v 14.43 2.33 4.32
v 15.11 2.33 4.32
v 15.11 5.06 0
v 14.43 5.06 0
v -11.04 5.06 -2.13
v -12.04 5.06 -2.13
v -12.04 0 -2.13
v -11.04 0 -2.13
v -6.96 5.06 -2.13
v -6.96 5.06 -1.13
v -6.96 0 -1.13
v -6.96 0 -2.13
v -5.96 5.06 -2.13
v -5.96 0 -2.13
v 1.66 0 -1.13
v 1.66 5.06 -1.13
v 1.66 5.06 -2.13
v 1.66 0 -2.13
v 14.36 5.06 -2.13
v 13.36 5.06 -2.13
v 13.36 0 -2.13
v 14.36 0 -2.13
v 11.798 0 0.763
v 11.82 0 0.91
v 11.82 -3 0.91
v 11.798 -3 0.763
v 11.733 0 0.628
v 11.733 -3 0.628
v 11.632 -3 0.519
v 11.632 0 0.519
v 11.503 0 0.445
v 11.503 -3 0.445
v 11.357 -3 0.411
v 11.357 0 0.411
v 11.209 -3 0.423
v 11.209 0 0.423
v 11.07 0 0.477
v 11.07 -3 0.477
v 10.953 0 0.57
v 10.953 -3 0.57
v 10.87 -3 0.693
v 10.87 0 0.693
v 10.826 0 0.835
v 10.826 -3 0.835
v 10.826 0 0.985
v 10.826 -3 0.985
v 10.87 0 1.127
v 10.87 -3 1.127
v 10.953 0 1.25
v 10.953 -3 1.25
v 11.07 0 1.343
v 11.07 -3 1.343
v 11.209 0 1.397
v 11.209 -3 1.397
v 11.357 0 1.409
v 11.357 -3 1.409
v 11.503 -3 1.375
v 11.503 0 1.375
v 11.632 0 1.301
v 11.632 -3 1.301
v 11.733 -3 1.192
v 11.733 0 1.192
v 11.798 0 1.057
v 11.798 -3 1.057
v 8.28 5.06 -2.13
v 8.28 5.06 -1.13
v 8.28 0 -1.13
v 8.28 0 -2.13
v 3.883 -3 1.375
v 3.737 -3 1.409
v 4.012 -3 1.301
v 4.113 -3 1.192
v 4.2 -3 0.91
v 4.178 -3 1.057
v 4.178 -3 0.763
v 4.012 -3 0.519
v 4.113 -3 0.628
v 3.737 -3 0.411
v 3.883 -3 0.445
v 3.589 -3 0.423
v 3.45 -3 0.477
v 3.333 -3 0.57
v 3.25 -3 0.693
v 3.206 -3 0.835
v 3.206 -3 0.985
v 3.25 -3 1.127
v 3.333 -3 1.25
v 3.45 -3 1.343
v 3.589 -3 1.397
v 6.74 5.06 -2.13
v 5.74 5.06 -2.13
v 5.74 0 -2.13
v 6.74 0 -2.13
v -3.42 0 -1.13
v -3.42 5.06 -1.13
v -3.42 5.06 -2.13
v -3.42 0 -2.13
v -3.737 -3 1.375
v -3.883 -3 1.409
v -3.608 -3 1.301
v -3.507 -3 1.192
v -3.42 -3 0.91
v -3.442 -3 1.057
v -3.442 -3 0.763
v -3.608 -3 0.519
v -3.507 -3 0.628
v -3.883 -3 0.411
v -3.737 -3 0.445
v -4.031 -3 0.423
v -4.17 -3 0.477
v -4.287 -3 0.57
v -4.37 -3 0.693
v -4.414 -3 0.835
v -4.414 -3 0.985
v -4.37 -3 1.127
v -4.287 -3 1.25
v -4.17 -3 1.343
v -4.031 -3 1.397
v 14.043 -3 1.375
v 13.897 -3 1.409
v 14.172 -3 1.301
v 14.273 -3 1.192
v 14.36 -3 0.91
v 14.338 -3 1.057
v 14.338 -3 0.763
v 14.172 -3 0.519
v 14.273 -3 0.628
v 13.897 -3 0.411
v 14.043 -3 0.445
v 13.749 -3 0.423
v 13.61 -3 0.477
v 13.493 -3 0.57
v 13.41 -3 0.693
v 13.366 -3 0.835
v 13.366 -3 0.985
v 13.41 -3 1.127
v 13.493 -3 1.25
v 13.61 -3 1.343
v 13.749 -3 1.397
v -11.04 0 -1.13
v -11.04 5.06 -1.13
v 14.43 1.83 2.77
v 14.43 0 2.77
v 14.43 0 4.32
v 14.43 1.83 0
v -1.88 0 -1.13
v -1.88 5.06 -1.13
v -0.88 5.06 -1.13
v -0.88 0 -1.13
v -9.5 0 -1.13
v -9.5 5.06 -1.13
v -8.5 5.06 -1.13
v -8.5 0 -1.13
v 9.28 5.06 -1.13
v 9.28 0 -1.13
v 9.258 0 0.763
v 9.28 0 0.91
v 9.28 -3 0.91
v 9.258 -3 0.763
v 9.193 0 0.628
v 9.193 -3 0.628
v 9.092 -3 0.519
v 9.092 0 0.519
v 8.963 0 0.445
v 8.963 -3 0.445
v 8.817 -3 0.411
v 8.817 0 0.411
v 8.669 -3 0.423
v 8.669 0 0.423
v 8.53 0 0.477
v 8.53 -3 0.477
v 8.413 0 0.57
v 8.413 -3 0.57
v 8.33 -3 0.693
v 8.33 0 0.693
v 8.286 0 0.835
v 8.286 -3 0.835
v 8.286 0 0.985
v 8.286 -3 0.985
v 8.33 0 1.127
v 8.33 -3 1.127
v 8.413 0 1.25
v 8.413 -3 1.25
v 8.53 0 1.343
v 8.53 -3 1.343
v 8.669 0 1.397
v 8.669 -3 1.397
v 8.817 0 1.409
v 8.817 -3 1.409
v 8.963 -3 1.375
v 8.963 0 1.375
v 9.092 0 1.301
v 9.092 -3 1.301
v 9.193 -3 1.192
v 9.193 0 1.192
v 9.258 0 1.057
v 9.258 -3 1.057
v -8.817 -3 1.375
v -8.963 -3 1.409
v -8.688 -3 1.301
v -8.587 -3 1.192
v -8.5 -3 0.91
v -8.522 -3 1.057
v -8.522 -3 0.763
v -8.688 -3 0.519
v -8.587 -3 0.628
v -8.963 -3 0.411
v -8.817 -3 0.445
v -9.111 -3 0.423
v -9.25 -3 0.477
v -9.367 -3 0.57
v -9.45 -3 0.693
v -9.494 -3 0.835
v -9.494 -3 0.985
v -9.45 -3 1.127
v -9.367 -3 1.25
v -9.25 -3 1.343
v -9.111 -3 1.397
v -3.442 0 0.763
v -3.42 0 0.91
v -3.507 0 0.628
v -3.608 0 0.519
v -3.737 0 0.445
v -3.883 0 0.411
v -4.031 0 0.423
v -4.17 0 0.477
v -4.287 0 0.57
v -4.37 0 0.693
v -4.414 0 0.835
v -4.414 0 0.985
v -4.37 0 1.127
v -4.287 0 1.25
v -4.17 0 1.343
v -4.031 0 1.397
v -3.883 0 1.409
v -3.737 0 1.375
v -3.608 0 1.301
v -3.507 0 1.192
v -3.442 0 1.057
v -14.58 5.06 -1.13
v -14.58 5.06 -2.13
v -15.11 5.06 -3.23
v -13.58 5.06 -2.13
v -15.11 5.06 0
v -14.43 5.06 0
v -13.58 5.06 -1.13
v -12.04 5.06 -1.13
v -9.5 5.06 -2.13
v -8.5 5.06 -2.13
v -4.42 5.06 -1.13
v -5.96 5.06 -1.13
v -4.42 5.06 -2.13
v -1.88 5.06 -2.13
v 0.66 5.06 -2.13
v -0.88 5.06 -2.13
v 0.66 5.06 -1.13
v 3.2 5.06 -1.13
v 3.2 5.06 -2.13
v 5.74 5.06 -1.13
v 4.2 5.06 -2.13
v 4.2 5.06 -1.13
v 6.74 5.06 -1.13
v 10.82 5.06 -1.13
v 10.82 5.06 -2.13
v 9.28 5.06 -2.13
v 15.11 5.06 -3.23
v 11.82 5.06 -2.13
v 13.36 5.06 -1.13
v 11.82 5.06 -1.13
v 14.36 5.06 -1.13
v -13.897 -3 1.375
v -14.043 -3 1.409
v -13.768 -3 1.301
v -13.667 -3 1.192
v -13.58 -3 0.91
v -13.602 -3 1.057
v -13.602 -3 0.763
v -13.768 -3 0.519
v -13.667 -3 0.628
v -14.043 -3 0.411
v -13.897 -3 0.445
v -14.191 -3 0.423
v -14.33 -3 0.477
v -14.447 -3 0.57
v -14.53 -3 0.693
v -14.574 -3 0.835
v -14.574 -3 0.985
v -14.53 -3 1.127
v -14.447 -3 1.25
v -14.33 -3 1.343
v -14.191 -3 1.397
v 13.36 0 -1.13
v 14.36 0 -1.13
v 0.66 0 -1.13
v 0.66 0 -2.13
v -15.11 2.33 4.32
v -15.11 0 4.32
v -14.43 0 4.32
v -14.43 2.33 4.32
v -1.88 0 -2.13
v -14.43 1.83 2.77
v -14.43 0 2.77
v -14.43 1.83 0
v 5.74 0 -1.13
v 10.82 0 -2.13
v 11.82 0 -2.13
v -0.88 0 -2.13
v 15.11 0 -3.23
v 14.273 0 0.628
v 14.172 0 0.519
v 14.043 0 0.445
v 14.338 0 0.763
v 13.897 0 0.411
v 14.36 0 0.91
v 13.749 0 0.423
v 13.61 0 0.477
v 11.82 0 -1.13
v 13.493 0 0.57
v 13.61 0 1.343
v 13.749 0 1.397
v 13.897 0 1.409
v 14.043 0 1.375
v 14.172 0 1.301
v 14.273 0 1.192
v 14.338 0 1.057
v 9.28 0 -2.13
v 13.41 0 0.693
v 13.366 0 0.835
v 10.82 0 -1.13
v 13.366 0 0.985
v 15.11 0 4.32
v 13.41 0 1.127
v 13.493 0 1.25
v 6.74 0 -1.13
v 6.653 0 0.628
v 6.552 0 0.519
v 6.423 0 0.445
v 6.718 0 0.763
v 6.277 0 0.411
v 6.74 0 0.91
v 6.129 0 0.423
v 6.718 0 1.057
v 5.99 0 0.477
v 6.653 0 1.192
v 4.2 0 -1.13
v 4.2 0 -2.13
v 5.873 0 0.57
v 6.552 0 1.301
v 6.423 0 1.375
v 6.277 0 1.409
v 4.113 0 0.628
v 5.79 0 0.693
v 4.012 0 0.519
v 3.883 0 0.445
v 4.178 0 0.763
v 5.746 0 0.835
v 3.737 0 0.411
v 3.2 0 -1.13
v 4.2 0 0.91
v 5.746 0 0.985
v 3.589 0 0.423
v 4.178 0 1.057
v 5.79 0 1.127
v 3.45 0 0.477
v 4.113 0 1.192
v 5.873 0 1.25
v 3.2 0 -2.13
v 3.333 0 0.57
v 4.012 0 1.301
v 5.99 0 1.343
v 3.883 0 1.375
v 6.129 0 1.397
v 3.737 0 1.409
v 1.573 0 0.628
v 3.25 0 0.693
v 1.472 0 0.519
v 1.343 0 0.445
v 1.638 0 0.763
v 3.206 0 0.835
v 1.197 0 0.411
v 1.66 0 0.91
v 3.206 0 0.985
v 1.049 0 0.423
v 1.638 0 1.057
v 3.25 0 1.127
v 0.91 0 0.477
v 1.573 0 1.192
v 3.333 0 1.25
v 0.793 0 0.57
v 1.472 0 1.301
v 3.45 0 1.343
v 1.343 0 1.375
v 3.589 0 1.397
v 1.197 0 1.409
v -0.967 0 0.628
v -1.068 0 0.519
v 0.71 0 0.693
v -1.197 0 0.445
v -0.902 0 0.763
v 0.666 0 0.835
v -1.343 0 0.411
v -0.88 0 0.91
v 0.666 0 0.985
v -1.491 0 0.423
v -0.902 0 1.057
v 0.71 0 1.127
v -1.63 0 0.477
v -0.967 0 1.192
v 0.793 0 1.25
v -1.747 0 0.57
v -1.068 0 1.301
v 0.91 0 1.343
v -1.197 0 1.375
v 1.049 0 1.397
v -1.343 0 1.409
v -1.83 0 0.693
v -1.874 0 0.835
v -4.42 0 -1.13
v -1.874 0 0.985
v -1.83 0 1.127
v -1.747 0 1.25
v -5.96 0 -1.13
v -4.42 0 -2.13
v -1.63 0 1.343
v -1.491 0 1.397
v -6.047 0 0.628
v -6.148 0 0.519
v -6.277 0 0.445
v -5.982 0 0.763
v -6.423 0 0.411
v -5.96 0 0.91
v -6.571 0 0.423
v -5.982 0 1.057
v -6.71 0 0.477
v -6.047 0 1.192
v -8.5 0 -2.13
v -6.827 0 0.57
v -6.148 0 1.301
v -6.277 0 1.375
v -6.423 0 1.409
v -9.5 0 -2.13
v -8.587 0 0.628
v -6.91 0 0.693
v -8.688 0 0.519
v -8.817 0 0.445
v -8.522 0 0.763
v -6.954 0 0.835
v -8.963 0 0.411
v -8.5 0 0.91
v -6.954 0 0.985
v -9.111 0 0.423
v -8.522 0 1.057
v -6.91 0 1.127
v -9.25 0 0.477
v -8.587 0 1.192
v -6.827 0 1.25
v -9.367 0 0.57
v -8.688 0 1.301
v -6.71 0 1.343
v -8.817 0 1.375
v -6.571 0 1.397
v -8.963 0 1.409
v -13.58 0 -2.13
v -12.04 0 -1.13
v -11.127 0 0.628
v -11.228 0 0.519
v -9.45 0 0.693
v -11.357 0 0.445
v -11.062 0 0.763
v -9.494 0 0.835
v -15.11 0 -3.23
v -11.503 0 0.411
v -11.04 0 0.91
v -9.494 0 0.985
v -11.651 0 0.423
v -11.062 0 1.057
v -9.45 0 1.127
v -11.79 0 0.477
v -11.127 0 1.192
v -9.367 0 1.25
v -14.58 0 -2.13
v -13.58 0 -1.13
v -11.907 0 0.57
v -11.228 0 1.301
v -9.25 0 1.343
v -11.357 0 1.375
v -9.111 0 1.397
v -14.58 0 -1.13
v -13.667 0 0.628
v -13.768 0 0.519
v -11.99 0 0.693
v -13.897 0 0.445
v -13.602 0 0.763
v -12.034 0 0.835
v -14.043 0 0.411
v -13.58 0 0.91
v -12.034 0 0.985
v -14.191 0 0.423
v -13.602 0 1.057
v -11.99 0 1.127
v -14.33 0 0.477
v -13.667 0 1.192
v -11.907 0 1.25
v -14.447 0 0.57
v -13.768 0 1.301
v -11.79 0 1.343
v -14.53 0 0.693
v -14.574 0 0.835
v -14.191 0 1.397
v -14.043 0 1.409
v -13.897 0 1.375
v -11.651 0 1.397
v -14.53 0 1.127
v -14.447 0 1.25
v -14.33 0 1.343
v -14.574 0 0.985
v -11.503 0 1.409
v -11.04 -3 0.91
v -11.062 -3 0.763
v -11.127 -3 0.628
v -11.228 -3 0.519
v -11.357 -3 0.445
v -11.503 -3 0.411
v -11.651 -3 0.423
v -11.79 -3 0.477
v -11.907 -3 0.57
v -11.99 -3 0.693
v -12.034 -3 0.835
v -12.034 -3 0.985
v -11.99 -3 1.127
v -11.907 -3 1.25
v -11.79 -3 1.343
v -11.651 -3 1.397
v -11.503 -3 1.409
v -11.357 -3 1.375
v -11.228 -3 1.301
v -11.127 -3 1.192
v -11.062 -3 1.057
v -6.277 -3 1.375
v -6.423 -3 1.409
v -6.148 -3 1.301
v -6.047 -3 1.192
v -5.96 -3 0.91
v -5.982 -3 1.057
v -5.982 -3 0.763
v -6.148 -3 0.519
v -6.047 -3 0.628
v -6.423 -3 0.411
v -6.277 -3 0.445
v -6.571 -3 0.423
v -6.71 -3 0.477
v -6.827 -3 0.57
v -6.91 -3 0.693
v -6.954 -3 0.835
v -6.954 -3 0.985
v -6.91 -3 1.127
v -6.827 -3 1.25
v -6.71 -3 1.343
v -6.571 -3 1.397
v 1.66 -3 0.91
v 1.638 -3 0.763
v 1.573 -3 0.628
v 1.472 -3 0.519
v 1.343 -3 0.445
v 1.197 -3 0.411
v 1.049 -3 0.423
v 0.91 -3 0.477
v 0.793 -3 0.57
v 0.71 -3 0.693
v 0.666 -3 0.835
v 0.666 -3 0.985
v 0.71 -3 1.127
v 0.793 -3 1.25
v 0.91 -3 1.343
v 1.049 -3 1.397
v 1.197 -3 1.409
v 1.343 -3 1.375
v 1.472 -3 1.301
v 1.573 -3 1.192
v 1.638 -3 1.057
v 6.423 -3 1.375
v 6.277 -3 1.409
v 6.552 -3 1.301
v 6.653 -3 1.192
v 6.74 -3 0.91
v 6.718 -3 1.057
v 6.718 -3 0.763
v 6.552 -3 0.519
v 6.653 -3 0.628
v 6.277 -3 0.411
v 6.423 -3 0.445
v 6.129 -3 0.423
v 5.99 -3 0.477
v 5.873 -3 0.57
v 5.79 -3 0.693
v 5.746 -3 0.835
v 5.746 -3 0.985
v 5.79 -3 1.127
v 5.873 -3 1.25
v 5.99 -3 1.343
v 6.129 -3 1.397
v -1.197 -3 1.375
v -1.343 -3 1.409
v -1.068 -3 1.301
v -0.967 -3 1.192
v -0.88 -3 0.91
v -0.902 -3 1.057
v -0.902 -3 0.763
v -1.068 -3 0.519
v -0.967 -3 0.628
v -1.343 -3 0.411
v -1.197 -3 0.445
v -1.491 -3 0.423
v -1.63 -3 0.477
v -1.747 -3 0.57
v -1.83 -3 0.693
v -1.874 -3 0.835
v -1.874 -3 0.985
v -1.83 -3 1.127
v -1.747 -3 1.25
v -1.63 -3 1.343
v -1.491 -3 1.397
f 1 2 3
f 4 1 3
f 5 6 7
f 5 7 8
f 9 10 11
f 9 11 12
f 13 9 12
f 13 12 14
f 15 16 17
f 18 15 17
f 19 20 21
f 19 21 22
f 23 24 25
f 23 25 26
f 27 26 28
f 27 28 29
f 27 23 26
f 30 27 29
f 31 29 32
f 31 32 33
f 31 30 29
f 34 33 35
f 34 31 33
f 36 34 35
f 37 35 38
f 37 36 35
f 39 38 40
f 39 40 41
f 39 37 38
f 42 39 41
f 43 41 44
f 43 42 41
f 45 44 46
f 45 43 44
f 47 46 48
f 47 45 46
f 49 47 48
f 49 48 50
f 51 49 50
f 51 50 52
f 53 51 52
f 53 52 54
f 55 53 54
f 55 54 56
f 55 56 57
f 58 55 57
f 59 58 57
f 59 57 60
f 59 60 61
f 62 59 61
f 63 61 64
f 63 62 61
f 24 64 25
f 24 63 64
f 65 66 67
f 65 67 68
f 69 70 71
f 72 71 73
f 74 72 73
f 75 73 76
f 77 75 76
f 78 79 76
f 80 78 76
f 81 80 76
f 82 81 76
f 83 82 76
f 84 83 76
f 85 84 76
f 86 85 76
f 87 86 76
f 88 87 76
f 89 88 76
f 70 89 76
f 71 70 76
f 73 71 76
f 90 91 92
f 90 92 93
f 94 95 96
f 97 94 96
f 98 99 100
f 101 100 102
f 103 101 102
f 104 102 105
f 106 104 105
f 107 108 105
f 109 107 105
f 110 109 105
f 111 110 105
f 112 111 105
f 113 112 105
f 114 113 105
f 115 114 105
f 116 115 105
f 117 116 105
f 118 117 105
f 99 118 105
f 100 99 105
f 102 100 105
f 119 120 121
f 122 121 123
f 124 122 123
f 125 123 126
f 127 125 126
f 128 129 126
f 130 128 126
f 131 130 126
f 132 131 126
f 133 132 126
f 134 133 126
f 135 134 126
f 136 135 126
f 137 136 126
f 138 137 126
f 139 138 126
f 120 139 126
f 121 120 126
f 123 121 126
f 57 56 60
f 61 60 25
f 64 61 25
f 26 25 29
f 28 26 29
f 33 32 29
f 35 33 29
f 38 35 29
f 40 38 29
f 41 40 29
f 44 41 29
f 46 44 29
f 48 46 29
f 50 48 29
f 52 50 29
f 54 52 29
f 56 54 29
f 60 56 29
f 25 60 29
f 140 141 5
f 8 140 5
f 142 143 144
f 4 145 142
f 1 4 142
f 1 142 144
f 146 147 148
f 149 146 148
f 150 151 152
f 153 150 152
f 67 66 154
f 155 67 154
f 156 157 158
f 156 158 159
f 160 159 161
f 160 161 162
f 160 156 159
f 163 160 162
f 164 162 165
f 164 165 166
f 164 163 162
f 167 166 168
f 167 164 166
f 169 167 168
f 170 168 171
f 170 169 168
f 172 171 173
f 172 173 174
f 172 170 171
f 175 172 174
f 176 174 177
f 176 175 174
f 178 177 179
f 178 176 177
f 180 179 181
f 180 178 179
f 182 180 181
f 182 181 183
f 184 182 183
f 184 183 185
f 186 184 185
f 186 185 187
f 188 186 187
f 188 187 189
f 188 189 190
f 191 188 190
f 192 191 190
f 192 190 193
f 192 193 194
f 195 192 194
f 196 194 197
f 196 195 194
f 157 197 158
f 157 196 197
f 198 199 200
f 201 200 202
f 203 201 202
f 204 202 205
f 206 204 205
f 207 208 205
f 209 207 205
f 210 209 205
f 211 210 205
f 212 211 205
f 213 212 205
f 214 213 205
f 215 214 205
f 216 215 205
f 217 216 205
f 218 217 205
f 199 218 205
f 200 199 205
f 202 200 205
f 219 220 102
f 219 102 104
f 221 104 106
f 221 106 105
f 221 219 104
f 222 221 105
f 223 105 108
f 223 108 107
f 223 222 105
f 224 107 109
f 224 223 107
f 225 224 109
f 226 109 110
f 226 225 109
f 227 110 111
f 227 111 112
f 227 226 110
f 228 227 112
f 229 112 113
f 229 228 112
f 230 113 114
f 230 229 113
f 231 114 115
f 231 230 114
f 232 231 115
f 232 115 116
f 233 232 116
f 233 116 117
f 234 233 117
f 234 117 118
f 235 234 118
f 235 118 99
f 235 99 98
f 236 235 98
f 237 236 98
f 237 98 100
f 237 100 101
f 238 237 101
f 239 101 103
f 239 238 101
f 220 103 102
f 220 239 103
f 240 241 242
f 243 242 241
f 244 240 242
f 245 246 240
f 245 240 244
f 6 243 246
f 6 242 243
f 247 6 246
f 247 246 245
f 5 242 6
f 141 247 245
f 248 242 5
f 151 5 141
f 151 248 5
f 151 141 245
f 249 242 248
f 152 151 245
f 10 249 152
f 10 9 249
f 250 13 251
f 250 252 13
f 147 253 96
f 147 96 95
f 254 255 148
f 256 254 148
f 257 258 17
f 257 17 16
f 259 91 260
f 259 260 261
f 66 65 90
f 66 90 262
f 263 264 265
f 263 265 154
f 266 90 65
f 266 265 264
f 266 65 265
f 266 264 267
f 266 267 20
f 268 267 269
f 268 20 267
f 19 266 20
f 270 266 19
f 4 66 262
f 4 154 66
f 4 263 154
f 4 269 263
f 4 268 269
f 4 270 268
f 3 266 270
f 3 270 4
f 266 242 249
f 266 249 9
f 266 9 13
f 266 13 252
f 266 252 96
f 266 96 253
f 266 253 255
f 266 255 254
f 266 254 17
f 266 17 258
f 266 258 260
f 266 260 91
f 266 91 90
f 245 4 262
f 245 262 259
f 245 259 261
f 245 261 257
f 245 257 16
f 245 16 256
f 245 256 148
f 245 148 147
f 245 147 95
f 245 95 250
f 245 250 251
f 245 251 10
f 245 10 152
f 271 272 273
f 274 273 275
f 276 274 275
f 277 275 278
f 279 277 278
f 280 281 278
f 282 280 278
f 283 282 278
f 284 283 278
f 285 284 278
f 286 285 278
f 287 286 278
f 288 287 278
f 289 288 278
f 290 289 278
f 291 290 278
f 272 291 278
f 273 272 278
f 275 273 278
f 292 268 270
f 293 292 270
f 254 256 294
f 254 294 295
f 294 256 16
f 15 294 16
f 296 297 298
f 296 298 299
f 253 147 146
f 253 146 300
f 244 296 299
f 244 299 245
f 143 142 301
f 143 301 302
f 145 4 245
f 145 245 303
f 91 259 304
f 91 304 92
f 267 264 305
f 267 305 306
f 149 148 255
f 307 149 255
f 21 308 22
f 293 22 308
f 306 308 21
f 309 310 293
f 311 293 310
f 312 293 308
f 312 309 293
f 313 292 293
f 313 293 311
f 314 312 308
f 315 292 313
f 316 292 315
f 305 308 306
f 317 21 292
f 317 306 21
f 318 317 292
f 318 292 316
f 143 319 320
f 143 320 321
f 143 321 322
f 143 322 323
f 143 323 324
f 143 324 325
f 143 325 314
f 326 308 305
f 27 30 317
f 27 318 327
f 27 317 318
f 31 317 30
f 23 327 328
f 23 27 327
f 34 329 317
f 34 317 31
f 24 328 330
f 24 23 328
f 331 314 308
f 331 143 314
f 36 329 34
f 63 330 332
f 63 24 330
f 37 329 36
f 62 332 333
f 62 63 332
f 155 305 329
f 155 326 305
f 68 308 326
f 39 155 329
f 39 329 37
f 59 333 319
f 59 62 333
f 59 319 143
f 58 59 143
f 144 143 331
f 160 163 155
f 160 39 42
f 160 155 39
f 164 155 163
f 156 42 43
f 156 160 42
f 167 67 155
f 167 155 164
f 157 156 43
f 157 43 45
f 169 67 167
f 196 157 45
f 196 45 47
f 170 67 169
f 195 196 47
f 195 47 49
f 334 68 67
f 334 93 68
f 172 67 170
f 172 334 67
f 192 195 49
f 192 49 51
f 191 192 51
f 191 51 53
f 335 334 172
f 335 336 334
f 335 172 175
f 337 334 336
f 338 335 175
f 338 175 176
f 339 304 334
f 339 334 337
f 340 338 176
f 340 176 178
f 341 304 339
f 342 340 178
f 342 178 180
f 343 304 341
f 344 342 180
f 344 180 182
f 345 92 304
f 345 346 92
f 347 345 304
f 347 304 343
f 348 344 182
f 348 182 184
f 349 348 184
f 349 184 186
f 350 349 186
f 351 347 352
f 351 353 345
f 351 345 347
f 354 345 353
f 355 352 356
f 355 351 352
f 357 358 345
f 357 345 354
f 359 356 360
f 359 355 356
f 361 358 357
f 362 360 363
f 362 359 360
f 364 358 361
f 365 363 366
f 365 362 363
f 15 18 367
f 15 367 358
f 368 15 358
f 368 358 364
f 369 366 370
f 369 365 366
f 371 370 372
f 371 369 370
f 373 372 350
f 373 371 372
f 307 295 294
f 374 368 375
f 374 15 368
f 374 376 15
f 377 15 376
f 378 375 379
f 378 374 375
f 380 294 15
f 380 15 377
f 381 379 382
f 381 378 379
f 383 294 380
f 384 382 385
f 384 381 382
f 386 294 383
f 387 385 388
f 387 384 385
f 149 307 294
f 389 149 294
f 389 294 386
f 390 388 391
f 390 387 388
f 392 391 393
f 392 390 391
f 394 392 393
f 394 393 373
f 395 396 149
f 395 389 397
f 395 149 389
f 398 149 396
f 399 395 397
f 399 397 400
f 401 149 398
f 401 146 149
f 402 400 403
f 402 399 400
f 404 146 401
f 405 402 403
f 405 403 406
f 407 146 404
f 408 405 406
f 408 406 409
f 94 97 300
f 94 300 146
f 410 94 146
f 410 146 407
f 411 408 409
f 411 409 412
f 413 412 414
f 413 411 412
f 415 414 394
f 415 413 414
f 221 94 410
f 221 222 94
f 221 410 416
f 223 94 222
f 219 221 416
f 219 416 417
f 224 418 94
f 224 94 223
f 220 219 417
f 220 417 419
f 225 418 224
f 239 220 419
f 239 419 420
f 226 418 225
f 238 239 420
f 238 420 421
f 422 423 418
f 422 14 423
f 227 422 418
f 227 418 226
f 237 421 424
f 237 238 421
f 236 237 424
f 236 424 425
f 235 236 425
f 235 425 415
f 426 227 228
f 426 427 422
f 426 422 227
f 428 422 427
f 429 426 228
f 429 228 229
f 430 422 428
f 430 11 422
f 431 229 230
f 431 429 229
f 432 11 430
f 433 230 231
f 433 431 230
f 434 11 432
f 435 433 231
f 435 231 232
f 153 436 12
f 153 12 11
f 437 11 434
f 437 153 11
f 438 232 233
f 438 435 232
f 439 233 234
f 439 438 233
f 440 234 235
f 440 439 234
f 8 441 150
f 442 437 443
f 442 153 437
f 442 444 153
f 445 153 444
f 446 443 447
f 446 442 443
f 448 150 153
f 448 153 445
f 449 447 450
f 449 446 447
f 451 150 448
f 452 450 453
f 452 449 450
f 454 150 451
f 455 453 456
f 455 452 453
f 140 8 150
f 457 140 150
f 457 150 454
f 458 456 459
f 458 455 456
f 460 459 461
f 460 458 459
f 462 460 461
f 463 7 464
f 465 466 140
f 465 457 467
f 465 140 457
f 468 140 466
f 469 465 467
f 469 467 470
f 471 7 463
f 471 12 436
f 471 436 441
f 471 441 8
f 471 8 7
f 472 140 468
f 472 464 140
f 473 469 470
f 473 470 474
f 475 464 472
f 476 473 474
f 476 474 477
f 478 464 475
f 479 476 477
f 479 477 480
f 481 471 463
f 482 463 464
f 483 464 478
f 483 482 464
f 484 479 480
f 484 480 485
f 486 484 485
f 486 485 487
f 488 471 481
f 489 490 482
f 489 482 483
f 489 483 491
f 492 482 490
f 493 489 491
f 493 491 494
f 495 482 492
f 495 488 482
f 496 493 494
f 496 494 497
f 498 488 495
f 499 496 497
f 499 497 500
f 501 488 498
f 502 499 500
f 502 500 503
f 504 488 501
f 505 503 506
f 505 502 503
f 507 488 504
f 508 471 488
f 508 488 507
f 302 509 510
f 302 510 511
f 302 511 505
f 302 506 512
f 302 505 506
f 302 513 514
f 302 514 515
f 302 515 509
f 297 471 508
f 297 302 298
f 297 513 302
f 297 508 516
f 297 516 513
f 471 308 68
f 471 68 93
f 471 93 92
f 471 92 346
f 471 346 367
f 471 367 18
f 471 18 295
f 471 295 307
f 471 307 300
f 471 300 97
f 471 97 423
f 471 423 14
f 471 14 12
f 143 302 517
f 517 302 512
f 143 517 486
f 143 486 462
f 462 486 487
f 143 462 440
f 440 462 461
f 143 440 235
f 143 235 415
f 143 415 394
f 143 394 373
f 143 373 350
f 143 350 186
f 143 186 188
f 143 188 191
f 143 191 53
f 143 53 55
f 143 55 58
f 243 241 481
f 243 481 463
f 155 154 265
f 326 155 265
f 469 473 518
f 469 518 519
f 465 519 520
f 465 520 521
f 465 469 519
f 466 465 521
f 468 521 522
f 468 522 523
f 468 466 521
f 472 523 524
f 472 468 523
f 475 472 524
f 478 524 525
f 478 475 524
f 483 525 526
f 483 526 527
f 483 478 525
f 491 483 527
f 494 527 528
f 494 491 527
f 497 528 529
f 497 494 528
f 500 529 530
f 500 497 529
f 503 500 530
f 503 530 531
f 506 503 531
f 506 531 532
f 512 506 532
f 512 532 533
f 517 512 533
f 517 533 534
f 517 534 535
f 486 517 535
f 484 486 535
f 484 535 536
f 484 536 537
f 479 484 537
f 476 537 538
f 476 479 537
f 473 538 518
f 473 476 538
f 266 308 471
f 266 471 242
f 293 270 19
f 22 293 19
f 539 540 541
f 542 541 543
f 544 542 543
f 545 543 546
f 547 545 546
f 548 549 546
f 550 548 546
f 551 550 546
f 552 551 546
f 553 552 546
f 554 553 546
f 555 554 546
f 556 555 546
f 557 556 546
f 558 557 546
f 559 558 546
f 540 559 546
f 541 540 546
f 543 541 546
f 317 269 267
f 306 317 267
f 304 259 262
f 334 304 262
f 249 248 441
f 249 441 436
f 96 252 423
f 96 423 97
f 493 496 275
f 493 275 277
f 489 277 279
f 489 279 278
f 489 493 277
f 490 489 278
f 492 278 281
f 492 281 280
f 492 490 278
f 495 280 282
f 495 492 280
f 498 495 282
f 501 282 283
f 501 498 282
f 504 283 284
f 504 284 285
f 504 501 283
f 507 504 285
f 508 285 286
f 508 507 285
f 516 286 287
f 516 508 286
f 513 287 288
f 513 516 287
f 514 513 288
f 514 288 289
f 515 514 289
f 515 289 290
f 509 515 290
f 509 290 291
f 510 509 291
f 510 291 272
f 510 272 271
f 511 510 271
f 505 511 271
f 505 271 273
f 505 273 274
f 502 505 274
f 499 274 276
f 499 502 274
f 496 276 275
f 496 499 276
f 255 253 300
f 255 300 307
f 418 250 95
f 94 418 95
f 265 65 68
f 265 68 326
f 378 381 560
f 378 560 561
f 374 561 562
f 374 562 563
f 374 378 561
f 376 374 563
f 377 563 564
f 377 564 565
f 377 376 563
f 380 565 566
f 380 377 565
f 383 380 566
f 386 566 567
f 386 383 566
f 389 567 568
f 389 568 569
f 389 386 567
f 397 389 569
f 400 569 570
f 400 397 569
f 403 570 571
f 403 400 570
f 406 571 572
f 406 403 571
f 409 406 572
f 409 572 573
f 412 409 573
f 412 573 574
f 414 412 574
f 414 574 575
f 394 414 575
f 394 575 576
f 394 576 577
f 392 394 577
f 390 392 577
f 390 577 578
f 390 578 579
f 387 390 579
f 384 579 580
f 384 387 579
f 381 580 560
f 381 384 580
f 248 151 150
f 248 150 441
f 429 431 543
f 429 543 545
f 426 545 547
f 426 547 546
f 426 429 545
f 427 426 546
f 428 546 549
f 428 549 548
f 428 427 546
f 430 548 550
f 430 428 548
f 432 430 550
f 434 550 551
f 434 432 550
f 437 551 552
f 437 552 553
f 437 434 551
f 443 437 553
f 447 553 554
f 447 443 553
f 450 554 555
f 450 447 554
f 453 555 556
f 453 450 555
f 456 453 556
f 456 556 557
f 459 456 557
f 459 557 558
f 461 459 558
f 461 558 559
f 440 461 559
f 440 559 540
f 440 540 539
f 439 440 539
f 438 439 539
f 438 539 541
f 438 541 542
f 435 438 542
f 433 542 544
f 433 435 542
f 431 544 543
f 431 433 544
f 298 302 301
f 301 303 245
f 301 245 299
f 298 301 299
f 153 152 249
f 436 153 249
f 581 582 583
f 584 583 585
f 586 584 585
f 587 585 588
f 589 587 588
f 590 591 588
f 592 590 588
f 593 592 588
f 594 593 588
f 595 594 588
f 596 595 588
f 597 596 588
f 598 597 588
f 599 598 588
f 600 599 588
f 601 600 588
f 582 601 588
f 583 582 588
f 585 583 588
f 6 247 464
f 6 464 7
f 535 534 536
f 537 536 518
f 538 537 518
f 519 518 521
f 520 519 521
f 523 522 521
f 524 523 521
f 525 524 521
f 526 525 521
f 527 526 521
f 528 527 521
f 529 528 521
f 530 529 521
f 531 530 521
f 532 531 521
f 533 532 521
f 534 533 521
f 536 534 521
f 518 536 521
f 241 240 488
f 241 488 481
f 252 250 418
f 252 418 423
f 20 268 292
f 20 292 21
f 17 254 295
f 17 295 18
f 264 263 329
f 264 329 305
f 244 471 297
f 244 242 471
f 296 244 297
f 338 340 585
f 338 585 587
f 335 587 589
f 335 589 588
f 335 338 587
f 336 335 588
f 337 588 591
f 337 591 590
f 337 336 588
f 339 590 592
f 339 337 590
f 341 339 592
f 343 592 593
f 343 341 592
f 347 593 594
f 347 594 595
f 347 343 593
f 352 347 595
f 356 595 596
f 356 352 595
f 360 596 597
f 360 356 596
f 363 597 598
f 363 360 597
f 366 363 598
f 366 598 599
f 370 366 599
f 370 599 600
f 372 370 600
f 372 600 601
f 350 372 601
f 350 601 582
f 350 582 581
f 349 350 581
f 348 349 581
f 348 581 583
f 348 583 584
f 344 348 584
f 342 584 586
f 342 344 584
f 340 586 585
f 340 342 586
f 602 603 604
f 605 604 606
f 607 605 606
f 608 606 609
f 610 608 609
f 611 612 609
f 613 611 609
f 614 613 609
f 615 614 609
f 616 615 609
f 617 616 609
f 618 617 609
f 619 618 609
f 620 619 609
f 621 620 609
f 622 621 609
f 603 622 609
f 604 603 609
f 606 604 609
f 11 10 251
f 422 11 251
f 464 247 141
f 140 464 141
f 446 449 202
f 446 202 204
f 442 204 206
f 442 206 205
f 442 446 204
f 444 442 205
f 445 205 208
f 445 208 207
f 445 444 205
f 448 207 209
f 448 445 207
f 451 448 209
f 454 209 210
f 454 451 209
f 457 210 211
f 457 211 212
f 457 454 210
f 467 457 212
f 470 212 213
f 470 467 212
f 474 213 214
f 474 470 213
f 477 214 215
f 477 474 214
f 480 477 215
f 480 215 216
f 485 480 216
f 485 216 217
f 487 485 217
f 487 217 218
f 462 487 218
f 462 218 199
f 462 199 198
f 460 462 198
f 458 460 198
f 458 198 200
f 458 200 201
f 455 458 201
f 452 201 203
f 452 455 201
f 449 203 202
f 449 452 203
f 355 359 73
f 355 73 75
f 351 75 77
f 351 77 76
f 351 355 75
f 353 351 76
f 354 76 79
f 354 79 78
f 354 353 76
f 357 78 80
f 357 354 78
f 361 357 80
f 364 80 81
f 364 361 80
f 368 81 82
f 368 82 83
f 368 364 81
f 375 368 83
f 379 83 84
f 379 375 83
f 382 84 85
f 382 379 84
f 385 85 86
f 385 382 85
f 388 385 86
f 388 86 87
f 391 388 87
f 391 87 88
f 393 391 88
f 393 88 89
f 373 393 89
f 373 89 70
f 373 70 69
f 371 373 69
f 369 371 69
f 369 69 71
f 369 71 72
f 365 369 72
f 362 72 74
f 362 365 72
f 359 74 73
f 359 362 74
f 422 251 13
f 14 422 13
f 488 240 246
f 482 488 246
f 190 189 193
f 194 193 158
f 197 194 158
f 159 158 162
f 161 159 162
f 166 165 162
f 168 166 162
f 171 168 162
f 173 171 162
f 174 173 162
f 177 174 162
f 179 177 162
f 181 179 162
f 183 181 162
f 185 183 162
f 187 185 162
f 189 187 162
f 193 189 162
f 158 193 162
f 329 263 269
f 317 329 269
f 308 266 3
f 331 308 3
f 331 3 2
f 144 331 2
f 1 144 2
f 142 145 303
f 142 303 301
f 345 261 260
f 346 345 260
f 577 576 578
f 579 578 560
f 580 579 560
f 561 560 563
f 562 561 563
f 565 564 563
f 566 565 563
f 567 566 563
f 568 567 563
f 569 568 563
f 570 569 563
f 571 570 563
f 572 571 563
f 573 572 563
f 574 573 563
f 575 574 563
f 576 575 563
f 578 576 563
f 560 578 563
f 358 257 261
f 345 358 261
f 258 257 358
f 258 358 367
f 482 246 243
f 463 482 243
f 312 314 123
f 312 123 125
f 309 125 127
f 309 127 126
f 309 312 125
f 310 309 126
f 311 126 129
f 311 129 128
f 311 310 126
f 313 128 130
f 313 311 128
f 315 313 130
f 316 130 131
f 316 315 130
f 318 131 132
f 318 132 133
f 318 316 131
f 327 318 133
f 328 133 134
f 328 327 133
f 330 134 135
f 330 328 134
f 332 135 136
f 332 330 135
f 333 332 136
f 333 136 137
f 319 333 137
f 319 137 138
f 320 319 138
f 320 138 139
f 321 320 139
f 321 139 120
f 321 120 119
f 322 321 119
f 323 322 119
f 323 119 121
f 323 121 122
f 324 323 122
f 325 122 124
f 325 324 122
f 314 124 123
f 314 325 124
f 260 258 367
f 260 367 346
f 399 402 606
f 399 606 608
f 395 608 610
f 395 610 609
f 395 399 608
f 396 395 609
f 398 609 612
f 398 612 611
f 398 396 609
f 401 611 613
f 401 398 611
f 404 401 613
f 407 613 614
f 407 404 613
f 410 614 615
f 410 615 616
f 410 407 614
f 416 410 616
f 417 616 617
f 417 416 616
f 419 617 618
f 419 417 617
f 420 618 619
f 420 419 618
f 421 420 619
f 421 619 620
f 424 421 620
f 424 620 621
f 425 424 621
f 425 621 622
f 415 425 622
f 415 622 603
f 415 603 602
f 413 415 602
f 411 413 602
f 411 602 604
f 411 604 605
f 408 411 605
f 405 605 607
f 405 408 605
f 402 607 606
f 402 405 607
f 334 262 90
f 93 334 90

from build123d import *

# Parameters (mm, degrees)
BOSS_EXTRUDE1_DEPTH = 15.11
BOSS_EXTRUDE2_DEPTH = 0.68
SKETCH3_W           = 1
SKETCH3_H           = 1
CUT_EXTRUDE1_DEPTH  = 6.06
SKETCH4_R           = 0.5
BOSS_EXTRUDE3_DEPTH = 3
LPATTERN1_COUNT     = 12
LPATTERN1_PITCH     = 2.54


with BuildPart() as part:
    # Sketch1 → Boss-Extrude1 (new body, symmetric)
    with BuildSketch(Plane(origin=(0, 0, 0), x_dir=(0, 0, -1), z_dir=(1, 0, 0))):
        Polygon((-2.77, 0), (3.23, 0), (3.23, 5.06), (0, 5.06), (0, 1.83), (-2.77, 1.83), align=None)
    extrude(amount=BOSS_EXTRUDE1_DEPTH, both=True)

    # Sketch2 → Boss-Extrude2 (add)
    with BuildSketch(Plane(origin=(15.11, 0, 0), x_dir=(0, 0, -1), z_dir=(1, 0, 0))):
        Polygon((-4.32, 0), (-4.32, 2.33), (0, 5.06), (0, 0), align=None)
    boss_extrude2 = extrude(amount=-BOSS_EXTRUDE2_DEPTH)

    # Mirror1: Boss-Extrude2 across plane
    add(boss_extrude2.mirror(Plane(origin=(0, 0, 0), x_dir=(0, 0, 1), z_dir=(1, 0, 0))))

    # Sketch3 → Cut-Extrude1 (cut, through all)
    with BuildSketch(Plane(origin=(0, 5.06, 0), x_dir=(1, 0, 0), z_dir=(0, 1, 0))):
        with Locations((13.86, 1.63)):
            Rectangle(SKETCH3_W, SKETCH3_H)
    cut_extrude1 = extrude(amount=-CUT_EXTRUDE1_DEPTH, mode=Mode.SUBTRACT)

    # Sketch4 → Boss-Extrude3 (add)
    with BuildSketch(Plane(origin=(0, 0, 0), x_dir=(1, 0, 0), z_dir=(0, 1, 0))):
        with Locations((13.86, -0.91)):
            Circle(SKETCH4_R)
    boss_extrude3 = extrude(amount=-BOSS_EXTRUDE3_DEPTH)

    # LPattern1: Cut-Extrude1, Boss-Extrude3 ×12
    with Locations(*[(-i * LPATTERN1_PITCH, 0, 0) for i in range(1, LPATTERN1_COUNT)]):
        add(cut_extrude1, mode=Mode.SUBTRACT)
        add(boss_extrude3)


solid = part.part
